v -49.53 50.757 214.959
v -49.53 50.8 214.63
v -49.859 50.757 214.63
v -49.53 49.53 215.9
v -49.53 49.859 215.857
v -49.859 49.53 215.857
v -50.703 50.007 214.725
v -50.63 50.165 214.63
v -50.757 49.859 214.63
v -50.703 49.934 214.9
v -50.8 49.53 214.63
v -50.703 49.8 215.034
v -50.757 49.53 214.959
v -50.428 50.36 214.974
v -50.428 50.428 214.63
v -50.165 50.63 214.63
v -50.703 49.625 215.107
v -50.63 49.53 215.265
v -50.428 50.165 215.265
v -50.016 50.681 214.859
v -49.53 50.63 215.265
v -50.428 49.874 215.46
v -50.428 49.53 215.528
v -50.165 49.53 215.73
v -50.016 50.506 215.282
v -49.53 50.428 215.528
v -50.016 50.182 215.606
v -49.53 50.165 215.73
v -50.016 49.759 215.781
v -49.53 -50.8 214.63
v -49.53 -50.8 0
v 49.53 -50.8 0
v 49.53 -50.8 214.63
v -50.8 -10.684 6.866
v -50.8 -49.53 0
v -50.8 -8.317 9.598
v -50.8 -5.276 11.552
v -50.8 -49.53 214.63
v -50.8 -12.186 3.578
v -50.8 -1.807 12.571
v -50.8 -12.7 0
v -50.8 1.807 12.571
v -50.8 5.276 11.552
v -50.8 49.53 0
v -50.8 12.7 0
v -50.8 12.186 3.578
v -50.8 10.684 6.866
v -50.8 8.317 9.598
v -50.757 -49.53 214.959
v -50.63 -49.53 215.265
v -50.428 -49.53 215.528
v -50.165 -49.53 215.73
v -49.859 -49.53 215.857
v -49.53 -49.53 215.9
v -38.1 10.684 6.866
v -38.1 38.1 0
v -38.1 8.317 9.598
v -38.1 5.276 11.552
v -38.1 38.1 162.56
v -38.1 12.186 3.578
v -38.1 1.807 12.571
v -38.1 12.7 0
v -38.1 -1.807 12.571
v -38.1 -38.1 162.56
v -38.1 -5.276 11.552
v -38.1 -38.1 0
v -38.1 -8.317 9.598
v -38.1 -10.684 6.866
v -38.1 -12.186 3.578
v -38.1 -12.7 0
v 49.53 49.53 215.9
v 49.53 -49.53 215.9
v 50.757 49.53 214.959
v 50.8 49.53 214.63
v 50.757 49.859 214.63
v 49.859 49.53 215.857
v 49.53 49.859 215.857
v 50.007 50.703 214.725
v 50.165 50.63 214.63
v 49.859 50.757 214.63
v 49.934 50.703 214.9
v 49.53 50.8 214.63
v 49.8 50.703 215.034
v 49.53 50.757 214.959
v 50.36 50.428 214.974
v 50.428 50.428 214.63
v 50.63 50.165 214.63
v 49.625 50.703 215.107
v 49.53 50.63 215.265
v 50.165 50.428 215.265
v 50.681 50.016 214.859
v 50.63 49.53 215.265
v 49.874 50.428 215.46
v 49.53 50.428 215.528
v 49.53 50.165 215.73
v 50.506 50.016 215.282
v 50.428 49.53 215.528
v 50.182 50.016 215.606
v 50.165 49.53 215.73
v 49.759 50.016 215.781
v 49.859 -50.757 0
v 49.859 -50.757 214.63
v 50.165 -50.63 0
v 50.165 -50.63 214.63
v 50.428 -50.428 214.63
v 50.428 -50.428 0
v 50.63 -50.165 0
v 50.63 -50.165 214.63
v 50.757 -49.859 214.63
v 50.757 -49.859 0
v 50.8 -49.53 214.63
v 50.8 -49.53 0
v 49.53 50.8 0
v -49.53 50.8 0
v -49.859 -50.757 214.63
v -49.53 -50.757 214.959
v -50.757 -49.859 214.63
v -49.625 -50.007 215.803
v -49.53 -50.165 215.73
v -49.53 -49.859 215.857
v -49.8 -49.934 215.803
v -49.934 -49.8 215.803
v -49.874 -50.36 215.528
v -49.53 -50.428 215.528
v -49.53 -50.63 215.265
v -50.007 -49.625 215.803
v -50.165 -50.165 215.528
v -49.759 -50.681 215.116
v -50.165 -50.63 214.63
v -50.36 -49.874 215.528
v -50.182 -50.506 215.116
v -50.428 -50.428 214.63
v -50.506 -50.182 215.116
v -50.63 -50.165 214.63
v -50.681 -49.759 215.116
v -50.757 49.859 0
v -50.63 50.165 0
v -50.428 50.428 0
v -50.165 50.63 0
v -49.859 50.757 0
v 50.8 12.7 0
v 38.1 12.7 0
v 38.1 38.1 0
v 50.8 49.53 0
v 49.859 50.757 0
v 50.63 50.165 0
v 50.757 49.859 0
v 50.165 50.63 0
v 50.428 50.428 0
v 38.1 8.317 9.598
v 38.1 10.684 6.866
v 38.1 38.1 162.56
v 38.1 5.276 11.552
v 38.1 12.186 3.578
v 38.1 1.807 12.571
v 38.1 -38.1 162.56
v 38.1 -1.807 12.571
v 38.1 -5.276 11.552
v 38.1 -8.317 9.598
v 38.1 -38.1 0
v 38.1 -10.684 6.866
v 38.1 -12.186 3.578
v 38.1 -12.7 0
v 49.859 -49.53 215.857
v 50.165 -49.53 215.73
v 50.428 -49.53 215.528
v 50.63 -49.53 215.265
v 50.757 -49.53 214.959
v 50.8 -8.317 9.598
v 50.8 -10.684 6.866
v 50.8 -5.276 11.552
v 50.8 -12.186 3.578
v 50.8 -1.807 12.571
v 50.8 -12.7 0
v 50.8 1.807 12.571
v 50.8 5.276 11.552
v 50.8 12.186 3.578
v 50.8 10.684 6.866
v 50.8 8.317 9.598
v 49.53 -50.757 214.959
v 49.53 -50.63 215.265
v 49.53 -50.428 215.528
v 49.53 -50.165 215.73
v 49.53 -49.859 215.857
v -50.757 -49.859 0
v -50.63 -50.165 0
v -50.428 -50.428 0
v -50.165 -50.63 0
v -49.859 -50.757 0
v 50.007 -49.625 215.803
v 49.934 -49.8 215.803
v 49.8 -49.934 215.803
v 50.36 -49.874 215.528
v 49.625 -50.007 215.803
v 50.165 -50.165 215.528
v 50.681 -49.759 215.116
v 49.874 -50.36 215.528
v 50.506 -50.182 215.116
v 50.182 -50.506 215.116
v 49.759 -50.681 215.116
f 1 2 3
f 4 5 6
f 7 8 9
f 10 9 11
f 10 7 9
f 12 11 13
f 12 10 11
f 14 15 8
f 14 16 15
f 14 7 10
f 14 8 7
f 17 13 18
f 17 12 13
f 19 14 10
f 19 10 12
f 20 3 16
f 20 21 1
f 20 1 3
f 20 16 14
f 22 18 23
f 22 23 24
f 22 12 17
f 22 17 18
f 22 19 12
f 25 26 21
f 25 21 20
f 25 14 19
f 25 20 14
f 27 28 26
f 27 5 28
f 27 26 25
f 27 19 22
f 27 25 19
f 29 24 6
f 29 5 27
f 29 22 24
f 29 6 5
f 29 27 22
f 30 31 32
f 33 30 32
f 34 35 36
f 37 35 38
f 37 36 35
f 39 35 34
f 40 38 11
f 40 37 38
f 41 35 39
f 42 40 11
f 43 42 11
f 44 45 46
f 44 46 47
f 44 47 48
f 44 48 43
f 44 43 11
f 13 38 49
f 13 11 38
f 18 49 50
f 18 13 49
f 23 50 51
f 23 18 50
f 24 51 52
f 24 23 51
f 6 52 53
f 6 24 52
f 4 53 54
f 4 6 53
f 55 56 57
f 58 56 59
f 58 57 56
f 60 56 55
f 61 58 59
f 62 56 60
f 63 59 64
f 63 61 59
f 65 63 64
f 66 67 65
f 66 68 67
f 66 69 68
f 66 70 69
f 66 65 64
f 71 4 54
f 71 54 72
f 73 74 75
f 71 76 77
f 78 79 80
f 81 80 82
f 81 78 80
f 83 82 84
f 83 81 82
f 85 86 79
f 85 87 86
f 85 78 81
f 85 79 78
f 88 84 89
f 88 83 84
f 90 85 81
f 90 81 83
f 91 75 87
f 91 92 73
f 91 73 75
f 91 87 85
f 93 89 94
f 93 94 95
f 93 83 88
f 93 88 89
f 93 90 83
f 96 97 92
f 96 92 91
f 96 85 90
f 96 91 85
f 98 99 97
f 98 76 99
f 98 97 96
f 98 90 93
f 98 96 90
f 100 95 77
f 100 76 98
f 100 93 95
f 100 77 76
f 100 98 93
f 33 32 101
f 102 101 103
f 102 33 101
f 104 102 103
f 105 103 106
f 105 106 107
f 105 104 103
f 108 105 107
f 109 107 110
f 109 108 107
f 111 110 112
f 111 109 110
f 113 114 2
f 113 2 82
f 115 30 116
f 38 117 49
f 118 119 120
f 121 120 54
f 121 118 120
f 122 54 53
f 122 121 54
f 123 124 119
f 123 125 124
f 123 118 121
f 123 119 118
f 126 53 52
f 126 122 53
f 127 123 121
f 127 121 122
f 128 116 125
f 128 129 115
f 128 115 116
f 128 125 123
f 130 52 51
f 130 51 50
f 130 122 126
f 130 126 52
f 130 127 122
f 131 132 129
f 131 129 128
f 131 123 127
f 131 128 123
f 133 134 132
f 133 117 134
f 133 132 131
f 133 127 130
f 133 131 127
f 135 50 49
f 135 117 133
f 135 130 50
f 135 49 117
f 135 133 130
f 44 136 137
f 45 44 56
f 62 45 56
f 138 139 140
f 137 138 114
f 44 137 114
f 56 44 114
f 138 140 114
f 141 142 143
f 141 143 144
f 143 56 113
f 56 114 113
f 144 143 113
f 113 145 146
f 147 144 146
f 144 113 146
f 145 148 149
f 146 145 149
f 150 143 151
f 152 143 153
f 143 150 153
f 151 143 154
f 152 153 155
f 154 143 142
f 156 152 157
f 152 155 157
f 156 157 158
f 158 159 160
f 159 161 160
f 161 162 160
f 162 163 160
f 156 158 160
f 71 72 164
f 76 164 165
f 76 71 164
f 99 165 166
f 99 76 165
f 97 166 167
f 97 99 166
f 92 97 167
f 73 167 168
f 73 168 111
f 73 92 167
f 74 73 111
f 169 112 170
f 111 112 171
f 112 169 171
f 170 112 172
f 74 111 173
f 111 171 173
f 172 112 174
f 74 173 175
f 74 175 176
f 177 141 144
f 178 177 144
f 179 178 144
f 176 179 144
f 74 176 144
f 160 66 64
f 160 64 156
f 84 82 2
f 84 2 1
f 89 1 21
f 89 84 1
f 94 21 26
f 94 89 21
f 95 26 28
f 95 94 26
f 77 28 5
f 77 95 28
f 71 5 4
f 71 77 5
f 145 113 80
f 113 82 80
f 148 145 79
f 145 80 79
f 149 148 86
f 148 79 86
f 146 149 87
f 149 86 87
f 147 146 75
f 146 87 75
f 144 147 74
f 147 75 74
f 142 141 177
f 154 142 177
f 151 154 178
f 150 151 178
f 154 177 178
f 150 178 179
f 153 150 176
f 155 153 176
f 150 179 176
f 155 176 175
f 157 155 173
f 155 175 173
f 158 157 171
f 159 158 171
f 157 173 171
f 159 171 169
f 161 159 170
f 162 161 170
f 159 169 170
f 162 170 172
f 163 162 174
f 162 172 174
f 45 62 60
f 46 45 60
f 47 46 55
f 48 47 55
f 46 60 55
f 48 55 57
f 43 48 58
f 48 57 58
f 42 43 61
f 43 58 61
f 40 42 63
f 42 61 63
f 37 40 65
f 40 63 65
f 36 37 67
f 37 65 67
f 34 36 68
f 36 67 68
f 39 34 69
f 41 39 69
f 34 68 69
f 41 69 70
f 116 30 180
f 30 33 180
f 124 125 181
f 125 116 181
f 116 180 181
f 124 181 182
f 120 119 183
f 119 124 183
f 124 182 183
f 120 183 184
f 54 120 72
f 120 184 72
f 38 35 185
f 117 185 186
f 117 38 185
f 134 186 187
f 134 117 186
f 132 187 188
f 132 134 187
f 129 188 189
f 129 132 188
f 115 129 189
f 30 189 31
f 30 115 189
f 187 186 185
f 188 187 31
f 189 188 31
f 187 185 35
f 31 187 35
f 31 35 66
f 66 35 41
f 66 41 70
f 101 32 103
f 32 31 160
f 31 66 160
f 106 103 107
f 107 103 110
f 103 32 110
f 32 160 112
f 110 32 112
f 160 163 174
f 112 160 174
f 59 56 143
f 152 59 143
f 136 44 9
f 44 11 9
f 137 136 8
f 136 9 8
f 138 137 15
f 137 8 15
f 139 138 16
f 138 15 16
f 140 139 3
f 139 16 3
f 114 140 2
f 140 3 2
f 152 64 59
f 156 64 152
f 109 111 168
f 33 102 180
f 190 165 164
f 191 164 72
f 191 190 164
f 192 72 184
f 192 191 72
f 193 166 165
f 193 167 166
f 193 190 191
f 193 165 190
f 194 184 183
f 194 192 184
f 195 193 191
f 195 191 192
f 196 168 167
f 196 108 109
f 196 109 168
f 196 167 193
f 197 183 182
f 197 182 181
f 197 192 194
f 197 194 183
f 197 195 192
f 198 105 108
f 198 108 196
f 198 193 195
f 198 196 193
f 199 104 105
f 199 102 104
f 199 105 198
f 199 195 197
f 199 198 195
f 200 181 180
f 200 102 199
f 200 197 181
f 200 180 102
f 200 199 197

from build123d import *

# Parameters (mm, degrees)
F0_W     = 101.6
F0_H     = 101.6
F1_DEPTH = 215.9
F2_W     = 76.2
F2_H     = 76.2
F3_DEPTH = 162.56
F4_R     = 1.27
F5_R     = 12.7
F6_DEPTH = 101.601


with BuildPart() as f1:
    # F0 (on Top) → F1 (new body)
    with BuildSketch(Plane.XY):
        Rectangle(F0_W, F0_H)
    extrude(amount=F1_DEPTH)

    # F2 (on face) → F3 (cut)
    with BuildSketch(Plane(origin=(0, 0, 0), x_dir=(1, 0, 0), z_dir=(0, 0, -1))):
        Rectangle(F2_W, F2_H)
    extrude(amount=-F3_DEPTH, mode=Mode.SUBTRACT)

    # F4
    f4_edges = [f1.edges().sort_by_distance(p)[0] for p in [
        (50.8, -50.8, 107.95),
        (50.8, 0, 215.9),
        (50.8, 50.8, 107.95),
        (-50.8, -50.8, 107.95),
        (0, -50.8, 215.9),
        (0, 50.8, 215.9),
        (-50.8, 50.8, 107.95),
        (-50.8, 0, 215.9),
    ]]
    fillet(f4_edges, radius=F4_R)

    # F5 (on face) → F6 (cut, through all)
    with BuildSketch(Plane.YZ.offset(50.8)):
        Circle(F5_R)
    extrude(amount=-F6_DEPTH, mode=Mode.SUBTRACT)


solid = f1.part
